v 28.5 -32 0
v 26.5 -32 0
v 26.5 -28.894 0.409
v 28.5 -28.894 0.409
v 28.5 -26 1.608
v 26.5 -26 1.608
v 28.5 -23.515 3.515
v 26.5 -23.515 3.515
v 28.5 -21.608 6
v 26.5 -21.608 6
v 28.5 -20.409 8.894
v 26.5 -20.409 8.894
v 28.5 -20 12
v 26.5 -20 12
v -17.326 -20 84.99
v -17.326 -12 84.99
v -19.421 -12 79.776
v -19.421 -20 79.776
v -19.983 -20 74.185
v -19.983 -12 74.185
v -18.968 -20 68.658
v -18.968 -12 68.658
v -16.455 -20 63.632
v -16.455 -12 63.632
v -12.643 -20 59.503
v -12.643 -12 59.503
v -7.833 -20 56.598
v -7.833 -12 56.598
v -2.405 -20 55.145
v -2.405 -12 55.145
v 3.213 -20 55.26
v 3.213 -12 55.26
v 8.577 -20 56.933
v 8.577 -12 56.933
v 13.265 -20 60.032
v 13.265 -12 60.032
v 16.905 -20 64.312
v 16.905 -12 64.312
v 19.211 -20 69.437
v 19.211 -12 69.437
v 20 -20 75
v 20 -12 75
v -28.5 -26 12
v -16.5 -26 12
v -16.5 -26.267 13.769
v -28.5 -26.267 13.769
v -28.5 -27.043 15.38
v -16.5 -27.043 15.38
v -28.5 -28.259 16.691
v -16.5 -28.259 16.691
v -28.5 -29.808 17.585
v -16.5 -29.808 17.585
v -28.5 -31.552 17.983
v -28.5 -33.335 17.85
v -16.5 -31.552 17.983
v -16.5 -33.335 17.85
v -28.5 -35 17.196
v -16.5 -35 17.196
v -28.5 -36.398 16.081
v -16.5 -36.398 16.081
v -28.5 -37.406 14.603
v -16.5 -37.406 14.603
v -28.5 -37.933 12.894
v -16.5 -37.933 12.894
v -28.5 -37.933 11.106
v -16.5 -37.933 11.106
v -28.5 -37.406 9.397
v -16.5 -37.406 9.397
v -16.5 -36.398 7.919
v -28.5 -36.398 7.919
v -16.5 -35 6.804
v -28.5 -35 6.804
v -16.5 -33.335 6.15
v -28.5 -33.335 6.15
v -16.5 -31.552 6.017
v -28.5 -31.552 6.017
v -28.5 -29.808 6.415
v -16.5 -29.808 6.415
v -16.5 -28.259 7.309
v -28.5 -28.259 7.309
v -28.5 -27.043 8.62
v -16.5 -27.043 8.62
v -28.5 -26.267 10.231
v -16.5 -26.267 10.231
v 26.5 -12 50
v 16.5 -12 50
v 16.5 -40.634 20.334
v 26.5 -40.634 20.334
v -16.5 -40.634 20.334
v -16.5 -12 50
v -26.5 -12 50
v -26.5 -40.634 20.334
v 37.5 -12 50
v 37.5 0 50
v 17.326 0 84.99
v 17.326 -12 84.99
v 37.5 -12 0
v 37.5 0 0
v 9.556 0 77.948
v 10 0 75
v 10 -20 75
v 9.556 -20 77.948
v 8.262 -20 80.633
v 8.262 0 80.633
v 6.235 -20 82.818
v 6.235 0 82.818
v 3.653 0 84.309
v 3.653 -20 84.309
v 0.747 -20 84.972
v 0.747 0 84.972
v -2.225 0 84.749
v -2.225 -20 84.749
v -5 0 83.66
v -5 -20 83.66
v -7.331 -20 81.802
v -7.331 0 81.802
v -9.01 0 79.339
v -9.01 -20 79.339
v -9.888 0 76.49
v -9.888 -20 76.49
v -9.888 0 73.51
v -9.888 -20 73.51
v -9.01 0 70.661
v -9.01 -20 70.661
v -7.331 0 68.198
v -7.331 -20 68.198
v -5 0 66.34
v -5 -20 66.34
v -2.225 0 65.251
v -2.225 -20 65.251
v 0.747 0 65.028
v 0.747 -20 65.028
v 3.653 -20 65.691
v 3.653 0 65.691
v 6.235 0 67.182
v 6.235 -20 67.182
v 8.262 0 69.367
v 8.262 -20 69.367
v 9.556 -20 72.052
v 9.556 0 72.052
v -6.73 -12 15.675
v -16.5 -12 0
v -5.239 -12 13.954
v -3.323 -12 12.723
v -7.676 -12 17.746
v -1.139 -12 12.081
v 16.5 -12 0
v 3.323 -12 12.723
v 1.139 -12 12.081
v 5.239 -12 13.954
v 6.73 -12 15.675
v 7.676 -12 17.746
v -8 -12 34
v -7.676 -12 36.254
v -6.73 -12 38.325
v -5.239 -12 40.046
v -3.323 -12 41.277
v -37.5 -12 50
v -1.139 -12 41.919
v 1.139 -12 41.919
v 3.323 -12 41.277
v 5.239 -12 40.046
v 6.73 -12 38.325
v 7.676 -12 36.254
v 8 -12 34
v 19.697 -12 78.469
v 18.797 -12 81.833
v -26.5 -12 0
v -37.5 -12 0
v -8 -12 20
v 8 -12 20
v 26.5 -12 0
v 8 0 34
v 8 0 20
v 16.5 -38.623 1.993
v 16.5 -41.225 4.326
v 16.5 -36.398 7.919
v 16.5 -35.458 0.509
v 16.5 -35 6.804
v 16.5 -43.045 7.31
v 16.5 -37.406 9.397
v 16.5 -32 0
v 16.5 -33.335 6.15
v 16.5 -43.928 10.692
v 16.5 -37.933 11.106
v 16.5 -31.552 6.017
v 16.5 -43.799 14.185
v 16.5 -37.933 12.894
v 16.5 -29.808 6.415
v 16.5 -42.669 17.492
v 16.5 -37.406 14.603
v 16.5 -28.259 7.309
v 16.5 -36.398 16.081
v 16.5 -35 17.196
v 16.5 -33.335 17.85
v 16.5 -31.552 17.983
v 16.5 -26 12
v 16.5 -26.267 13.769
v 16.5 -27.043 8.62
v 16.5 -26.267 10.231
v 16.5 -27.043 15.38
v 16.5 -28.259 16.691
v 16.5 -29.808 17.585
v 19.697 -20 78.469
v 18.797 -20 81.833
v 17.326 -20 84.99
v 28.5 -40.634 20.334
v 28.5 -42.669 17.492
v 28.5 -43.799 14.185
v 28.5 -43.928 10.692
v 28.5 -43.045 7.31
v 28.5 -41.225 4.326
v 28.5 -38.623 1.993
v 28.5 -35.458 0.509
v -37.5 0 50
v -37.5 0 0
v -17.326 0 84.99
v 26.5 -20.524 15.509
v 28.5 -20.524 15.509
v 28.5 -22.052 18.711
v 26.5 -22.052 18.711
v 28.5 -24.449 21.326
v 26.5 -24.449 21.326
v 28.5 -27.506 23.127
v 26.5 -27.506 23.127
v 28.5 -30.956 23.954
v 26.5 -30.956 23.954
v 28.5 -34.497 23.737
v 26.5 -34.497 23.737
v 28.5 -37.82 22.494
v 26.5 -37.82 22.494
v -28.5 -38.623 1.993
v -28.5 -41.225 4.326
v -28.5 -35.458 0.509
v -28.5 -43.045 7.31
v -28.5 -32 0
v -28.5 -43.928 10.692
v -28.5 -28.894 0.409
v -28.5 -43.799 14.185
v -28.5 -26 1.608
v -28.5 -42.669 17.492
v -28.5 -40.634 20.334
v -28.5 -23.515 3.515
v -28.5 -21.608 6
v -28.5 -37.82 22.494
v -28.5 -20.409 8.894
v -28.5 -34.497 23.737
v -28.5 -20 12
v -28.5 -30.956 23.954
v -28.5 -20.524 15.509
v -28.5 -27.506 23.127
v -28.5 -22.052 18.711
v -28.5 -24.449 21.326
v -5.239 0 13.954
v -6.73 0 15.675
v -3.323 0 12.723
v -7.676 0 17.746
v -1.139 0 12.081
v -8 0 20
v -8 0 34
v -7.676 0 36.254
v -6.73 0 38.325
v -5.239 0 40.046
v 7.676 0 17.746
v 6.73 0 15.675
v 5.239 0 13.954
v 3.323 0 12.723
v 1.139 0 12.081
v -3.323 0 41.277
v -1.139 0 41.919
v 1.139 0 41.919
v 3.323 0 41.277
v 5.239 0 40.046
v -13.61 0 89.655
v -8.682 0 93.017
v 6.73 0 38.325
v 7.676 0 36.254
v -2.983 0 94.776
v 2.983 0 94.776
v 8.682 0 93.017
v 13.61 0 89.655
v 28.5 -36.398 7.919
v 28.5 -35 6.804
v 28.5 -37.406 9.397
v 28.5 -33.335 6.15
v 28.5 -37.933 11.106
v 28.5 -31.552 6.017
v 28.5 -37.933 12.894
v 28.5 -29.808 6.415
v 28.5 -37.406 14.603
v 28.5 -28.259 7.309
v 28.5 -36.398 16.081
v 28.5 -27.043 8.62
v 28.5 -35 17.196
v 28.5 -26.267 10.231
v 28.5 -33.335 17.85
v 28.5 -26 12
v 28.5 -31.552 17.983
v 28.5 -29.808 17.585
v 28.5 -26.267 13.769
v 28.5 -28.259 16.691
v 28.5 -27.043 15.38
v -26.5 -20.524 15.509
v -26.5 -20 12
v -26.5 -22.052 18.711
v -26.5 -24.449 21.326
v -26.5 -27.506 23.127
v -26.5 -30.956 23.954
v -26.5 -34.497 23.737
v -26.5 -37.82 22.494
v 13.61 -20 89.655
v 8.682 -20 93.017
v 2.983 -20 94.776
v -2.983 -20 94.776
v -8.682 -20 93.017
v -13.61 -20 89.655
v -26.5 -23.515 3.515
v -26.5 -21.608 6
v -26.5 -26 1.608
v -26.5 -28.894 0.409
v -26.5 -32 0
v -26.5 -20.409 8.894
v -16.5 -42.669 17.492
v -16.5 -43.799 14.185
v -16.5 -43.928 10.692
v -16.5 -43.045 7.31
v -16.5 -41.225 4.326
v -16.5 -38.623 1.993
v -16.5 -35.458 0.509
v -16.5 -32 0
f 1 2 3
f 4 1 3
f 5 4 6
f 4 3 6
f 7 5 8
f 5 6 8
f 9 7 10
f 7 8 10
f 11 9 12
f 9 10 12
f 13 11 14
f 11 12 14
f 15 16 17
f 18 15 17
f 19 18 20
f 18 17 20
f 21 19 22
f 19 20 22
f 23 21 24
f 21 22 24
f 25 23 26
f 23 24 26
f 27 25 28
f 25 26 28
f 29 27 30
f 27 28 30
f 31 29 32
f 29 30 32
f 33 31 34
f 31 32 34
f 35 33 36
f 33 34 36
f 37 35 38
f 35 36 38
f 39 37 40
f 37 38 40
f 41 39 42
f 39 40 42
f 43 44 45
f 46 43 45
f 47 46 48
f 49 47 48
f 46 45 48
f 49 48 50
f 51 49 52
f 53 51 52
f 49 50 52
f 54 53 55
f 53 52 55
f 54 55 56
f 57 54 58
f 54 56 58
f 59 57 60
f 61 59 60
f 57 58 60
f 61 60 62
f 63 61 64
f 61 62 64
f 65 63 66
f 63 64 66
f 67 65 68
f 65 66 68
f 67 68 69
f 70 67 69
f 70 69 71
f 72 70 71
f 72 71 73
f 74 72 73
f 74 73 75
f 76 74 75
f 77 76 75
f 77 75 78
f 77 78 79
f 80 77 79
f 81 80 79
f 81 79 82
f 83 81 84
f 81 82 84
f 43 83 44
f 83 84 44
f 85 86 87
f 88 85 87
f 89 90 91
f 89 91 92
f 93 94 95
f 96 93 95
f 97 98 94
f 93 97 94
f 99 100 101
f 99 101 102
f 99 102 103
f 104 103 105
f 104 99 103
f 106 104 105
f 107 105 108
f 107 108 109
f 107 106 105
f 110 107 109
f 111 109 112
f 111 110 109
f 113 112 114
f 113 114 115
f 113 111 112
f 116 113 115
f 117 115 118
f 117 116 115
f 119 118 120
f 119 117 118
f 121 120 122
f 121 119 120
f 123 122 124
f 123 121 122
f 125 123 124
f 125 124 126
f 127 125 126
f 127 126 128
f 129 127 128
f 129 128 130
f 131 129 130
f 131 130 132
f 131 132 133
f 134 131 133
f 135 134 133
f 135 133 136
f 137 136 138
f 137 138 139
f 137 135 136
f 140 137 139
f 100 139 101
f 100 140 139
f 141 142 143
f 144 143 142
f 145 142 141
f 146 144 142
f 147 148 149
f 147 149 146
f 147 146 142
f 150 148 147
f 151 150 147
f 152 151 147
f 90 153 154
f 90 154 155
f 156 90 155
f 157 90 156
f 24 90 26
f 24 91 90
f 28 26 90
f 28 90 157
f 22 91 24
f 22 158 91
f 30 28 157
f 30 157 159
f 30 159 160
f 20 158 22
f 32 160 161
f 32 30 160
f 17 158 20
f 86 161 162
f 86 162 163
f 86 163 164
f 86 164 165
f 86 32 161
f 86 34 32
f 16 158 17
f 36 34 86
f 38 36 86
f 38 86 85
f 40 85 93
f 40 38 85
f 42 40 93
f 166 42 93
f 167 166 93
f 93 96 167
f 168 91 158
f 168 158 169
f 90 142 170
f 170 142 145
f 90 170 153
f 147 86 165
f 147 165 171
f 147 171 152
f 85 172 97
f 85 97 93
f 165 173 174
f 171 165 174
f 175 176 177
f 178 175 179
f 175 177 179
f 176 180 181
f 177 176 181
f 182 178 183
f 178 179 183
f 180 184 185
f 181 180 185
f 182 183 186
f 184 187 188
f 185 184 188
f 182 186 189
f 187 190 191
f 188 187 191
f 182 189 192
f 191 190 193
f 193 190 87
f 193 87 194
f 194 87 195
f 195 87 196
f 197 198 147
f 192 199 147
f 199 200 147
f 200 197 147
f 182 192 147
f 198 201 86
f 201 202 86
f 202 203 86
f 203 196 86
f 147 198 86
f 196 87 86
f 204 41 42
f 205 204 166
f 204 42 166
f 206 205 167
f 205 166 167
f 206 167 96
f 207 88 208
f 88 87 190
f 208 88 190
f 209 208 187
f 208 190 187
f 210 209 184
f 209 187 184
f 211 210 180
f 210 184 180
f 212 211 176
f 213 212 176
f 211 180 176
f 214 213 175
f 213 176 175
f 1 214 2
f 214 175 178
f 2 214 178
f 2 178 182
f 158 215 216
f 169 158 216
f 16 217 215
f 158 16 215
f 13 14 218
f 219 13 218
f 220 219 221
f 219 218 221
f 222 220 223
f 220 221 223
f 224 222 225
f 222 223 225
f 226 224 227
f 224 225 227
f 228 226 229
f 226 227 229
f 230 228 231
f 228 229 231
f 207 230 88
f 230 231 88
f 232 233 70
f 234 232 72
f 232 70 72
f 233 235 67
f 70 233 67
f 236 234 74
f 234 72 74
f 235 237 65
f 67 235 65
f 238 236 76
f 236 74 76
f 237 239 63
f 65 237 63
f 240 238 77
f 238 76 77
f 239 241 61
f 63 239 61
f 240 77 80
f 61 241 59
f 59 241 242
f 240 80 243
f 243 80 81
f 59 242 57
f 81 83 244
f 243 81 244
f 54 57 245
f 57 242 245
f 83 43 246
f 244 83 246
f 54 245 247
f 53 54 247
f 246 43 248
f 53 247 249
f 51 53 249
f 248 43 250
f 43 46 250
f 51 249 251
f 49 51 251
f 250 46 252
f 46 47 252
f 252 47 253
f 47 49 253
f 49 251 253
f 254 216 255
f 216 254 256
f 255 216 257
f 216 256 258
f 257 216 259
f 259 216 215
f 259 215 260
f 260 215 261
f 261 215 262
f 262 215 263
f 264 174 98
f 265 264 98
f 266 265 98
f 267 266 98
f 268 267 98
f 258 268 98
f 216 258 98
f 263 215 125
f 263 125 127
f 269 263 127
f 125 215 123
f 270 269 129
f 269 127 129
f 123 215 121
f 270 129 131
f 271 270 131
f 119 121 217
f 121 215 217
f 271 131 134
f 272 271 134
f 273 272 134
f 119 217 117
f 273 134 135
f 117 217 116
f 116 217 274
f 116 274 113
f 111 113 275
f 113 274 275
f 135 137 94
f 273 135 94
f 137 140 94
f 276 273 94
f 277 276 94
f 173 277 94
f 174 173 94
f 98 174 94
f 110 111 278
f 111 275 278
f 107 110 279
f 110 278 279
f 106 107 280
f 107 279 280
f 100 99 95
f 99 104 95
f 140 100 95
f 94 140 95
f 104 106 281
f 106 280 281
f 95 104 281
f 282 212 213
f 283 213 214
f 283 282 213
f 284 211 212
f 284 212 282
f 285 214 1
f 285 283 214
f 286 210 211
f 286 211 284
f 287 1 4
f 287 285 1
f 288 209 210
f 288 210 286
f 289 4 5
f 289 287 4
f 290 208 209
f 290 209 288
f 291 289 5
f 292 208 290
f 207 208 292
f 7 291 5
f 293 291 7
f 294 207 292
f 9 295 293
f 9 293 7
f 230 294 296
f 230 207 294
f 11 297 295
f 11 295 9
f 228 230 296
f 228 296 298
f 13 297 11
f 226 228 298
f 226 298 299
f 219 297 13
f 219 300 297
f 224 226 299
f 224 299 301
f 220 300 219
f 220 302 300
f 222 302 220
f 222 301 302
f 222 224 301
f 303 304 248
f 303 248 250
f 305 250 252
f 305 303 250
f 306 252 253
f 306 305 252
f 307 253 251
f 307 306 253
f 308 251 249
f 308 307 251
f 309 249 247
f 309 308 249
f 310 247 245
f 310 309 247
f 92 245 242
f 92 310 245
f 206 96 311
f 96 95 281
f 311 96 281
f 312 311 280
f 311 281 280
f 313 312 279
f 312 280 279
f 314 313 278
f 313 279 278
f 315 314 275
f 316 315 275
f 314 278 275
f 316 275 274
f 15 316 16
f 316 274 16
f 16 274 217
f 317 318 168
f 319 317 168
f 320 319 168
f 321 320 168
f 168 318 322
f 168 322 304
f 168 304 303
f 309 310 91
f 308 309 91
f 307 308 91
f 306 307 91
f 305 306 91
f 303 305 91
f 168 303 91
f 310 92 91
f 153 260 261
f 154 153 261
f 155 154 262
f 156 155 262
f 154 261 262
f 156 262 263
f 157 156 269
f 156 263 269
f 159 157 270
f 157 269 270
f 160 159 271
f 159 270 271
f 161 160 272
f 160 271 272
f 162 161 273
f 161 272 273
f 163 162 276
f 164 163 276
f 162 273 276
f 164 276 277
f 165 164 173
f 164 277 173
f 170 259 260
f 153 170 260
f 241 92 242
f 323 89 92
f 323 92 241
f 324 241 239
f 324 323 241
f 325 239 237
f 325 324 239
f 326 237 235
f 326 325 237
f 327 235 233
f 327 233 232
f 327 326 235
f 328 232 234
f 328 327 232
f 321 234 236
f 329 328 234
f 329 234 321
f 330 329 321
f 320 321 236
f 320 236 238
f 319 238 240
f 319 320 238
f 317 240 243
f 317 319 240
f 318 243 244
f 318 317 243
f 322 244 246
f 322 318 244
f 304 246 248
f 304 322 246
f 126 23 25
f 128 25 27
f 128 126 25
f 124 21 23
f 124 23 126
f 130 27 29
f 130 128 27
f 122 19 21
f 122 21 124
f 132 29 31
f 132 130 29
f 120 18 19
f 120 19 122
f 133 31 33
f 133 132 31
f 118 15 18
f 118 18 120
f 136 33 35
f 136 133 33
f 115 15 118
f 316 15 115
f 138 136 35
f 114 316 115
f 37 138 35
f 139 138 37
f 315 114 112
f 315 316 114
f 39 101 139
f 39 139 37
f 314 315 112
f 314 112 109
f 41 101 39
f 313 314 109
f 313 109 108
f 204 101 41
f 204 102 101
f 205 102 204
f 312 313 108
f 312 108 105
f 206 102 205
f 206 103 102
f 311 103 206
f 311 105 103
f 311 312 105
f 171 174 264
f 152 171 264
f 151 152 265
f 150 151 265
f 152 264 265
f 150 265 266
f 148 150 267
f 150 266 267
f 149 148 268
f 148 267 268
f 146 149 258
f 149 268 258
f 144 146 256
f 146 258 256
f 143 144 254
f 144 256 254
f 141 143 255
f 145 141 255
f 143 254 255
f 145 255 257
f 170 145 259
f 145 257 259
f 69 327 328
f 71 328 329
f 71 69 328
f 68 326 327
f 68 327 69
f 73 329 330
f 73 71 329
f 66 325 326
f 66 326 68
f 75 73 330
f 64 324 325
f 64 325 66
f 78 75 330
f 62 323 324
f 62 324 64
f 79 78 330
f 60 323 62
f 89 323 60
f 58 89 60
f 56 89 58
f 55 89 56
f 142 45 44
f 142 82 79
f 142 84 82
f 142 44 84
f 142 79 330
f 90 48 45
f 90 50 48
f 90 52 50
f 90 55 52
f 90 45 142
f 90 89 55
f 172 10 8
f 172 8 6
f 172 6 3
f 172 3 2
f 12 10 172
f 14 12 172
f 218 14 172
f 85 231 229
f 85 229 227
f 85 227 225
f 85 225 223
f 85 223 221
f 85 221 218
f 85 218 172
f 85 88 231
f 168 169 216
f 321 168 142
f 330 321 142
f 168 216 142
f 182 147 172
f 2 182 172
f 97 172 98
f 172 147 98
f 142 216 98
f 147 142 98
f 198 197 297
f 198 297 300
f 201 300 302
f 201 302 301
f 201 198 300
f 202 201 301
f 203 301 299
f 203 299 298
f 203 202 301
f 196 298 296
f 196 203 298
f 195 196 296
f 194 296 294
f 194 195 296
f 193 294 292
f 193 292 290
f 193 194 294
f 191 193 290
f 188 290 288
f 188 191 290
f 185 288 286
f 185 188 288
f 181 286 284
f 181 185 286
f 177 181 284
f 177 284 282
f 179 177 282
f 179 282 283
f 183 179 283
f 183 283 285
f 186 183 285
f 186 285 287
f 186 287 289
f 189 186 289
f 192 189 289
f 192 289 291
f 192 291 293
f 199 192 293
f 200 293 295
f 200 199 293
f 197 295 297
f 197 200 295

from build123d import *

# Parameters (mm, degrees)
F1_DEPTH = 12
F0_R     = 10
F2_DEPTH = 20
F5_DEPTH = 10
F4_R     = 6
F6_DEPTH = 12


# Not quite as in the source:
# - a pattern or mirror of a feature is missing from the dataset's text; its kind, count and spacing are read off the source's solid


with BuildPart() as f1:
    # F0 (on Front) → F1 (new body)
    with BuildSketch(Plane.XZ):
        with BuildLine():
            ThreePointArc((17.3264581055, 84.9896871582), (19.3200564454, 80.1706304205), (20, 75))
            ThreePointArc((20, 75), (-5.1706304205, 55.6799435546), (-17.3264581055, 84.9896871582))
            Line((-17.3264581055, 84.9896871582), (-37.5, 50))
            Line((-37.5, 50), (-37.5, 0))
            Line((-37.5, 0), (37.5, 0))
            Line((37.5, 0), (37.5, 50))
            Line((37.5, 50), (17.3264581055, 84.9896871582))
        make_face()
        with BuildLine():
            ThreePointArc((8, 20), (0, 12), (-8, 20))
            Line((-8, 20), (-8, 34))
            ThreePointArc((-8, 34), (0, 42), (8, 34))
            Line((8, 34), (8, 20))
        make_face(mode=Mode.SUBTRACT)
    extrude(amount=F1_DEPTH)

    # F0 (on Front) → F2 (join)
    with BuildSketch(Plane.XZ):
        with BuildLine():
            ThreePointArc((-17.3264581055, 84.9896871582), (-5.1706304205, 55.6799435546), (20, 75))
            ThreePointArc((20, 75), (19.3200564454, 80.1706304205), (17.3264581055, 84.9896871582))
            ThreePointArc((17.3264581055, 84.9896871582), (0, 95), (-17.3264581055, 84.9896871582))
        make_face()
        with Locations((0, 75)):
            Circle(F0_R, mode=Mode.SUBTRACT)
    extrude(amount=F2_DEPTH)

    # F4 (on offset) → F5 (join)
    with BuildSketch(Plane.YZ.offset(16.5)):
        with BuildLine():
            ThreePointArc((-40.6341440633, 20.3337600333), (-27.5061001769, 23.1267634279), (-20, 12))
            ThreePointArc((-20, 12), (-23.5147186258, 3.5147186258), (-32, 0))
            Line((-32, 0), (-12, 0))
            Line((-12, 0), (-12, 50))
            Line((-12, 50), (-40.6341440633, 20.3337600333))
        make_face()
    f5 = extrude(amount=F5_DEPTH)

    # F5_copies: F5 across plane
    add(f5.mirror(Plane(origin=(0, 0, 0), x_dir=(0, 0, -1), z_dir=(-1, 0, 0))))

    # F4 (on offset) → F6 (join)
    with BuildSketch(Plane.YZ.offset(16.5)):
        with BuildLine():
            ThreePointArc((-32, 0), (-23.5147186258, 3.5147186258), (-20, 12))
            ThreePointArc((-20, 12), (-27.5061001769, 23.1267634279), (-40.6341440633, 20.3337600333))
            ThreePointArc((-40.6341440633, 20.3337600333), (-43.0454769114, 7.3098571664), (-32, 0))
        make_face()
        with Locations((-32, 12)):
            Circle(F4_R, mode=Mode.SUBTRACT)
    f6 = extrude(amount=F6_DEPTH)

    # F6_copies: F6 across plane
    add(f6.mirror(Plane(origin=(0, 0, 0), x_dir=(0, 0, -1), z_dir=(-1, 0, 0))))


solid = f1.part
